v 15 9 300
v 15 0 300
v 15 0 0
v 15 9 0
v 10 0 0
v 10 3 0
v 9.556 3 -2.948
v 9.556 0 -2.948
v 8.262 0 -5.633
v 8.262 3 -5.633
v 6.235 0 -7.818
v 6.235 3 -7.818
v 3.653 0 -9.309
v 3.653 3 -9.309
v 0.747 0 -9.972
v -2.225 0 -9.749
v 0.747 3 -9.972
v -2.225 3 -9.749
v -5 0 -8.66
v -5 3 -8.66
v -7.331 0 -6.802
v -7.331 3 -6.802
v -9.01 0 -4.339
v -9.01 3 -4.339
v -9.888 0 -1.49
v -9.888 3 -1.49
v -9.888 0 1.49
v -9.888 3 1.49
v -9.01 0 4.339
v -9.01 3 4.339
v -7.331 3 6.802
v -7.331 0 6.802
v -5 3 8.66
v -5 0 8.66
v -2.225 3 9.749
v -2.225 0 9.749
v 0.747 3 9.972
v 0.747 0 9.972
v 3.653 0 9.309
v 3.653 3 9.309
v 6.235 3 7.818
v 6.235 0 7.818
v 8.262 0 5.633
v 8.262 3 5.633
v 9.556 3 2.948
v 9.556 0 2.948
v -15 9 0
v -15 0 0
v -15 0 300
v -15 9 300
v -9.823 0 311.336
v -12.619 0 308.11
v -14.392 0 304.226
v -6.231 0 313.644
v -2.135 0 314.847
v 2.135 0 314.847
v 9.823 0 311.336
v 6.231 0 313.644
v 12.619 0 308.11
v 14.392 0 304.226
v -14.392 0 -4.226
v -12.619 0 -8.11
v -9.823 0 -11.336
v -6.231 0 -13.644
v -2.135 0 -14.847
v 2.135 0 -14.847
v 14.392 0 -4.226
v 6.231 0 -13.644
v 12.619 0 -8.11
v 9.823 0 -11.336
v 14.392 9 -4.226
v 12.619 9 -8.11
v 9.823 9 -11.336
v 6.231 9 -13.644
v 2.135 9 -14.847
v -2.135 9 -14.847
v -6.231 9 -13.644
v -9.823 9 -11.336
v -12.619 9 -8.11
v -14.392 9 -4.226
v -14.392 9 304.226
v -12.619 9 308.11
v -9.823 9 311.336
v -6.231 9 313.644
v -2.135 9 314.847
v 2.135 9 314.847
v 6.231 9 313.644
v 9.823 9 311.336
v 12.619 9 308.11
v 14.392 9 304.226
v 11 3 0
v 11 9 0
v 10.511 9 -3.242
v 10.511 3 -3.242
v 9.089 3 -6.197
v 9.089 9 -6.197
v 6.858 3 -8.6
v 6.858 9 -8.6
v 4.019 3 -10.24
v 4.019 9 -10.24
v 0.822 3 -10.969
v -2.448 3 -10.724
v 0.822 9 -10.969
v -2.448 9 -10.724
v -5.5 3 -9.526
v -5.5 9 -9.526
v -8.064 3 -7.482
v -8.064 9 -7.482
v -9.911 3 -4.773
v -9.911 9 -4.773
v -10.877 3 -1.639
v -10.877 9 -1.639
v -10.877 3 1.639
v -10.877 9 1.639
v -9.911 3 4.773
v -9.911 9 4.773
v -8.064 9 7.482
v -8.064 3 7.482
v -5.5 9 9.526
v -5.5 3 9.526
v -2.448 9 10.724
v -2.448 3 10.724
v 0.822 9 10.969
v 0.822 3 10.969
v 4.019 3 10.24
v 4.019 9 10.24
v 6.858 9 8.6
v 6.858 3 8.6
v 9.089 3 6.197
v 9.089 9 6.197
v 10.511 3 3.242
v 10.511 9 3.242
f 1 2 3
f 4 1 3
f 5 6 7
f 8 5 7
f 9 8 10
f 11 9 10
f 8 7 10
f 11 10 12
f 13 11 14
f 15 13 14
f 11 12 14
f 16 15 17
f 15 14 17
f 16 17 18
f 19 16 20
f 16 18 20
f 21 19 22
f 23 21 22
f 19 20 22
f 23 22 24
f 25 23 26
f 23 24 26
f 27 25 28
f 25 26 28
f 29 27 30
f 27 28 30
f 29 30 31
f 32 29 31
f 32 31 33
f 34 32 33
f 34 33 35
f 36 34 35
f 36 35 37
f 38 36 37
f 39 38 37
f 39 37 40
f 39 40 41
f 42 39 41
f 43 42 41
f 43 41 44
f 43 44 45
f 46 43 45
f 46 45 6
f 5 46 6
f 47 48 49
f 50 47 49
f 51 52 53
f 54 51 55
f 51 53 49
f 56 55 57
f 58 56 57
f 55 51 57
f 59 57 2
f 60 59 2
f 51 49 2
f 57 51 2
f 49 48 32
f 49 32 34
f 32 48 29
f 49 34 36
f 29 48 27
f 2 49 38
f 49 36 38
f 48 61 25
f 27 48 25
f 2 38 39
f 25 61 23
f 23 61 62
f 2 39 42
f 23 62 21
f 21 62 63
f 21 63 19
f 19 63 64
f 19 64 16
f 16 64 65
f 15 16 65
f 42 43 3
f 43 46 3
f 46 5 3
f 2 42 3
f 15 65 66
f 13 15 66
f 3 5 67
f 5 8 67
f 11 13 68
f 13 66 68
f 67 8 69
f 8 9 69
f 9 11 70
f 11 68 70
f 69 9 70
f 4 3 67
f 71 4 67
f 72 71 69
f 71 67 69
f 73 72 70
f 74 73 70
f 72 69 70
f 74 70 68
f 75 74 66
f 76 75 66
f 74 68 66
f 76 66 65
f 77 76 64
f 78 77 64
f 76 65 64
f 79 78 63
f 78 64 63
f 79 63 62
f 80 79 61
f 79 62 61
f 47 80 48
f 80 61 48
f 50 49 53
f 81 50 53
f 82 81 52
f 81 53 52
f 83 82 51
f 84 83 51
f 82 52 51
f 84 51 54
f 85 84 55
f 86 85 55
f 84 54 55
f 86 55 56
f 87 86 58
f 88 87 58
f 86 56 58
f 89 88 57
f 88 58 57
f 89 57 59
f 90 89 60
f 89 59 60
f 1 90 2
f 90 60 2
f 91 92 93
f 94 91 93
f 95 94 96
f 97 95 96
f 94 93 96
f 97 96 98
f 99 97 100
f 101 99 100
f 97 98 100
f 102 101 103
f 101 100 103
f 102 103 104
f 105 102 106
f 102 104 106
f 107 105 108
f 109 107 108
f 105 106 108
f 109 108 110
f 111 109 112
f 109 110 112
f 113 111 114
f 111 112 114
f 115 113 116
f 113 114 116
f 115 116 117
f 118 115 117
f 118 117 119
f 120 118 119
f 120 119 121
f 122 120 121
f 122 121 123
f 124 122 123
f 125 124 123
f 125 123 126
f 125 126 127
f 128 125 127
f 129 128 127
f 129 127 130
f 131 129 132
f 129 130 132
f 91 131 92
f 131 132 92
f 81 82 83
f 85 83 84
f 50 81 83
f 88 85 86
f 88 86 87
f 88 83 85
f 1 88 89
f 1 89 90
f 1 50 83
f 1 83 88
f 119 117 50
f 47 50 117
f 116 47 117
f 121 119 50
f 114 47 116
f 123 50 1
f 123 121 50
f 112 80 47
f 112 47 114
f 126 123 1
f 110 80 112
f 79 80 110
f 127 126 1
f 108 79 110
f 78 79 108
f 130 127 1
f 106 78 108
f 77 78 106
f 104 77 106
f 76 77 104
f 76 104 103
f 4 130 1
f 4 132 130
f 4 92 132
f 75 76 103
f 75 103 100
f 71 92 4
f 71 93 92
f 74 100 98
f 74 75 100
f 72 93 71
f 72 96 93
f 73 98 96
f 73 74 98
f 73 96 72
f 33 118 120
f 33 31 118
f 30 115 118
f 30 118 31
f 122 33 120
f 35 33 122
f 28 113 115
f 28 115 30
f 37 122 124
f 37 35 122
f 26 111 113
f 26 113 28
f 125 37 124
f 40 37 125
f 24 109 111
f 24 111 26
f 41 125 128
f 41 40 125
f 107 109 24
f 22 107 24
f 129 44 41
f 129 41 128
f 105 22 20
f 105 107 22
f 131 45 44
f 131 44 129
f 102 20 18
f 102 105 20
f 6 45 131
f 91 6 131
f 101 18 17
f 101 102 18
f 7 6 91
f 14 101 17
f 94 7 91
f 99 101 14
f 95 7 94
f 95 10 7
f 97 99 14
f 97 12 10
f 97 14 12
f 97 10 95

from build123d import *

# Parameters (mm, degrees)
EXTRUDE_1_DEPTH     = 9
SKETCH_3_R          = 11
CUT_EXTRUDE_1_DEPTH = 6
SKETCH_4_R          = 10
CUT_EXTRUDE_2_DEPTH = 4


with BuildPart() as part:
    # 스케치2 → 보스-돌출1 (new body)
    with BuildSketch(Plane(origin=(0, 0, 0), x_dir=(1, 0, 0), z_dir=(0, 1, 0))):
        with BuildLine():
            Line((-15, 0), (-15, -300))
            ThreePointArc((-15, -300), (0, -315), (15, -300))
            Line((15, -300), (15, 0))
            ThreePointArc((15, 0), (0, 15), (-15, 0))
        make_face()
    extrude(amount=EXTRUDE_1_DEPTH)

    # 스케치3 → 컷-돌출1 (cut)
    with BuildSketch(Plane(origin=(0, 9, 0), x_dir=(1, 0, 0), z_dir=(0, 1, 0))):
        Circle(SKETCH_3_R)
    extrude(amount=-CUT_EXTRUDE_1_DEPTH, mode=Mode.SUBTRACT)

    # 스케치4 → 컷-돌출2 (cut, through all)
    with BuildSketch(Plane(origin=(0, 3, 0), x_dir=(1, 0, 0), z_dir=(0, 1, 0))):
        Circle(SKETCH_4_R)
    extrude(amount=-CUT_EXTRUDE_2_DEPTH, mode=Mode.SUBTRACT)


solid = part.part
